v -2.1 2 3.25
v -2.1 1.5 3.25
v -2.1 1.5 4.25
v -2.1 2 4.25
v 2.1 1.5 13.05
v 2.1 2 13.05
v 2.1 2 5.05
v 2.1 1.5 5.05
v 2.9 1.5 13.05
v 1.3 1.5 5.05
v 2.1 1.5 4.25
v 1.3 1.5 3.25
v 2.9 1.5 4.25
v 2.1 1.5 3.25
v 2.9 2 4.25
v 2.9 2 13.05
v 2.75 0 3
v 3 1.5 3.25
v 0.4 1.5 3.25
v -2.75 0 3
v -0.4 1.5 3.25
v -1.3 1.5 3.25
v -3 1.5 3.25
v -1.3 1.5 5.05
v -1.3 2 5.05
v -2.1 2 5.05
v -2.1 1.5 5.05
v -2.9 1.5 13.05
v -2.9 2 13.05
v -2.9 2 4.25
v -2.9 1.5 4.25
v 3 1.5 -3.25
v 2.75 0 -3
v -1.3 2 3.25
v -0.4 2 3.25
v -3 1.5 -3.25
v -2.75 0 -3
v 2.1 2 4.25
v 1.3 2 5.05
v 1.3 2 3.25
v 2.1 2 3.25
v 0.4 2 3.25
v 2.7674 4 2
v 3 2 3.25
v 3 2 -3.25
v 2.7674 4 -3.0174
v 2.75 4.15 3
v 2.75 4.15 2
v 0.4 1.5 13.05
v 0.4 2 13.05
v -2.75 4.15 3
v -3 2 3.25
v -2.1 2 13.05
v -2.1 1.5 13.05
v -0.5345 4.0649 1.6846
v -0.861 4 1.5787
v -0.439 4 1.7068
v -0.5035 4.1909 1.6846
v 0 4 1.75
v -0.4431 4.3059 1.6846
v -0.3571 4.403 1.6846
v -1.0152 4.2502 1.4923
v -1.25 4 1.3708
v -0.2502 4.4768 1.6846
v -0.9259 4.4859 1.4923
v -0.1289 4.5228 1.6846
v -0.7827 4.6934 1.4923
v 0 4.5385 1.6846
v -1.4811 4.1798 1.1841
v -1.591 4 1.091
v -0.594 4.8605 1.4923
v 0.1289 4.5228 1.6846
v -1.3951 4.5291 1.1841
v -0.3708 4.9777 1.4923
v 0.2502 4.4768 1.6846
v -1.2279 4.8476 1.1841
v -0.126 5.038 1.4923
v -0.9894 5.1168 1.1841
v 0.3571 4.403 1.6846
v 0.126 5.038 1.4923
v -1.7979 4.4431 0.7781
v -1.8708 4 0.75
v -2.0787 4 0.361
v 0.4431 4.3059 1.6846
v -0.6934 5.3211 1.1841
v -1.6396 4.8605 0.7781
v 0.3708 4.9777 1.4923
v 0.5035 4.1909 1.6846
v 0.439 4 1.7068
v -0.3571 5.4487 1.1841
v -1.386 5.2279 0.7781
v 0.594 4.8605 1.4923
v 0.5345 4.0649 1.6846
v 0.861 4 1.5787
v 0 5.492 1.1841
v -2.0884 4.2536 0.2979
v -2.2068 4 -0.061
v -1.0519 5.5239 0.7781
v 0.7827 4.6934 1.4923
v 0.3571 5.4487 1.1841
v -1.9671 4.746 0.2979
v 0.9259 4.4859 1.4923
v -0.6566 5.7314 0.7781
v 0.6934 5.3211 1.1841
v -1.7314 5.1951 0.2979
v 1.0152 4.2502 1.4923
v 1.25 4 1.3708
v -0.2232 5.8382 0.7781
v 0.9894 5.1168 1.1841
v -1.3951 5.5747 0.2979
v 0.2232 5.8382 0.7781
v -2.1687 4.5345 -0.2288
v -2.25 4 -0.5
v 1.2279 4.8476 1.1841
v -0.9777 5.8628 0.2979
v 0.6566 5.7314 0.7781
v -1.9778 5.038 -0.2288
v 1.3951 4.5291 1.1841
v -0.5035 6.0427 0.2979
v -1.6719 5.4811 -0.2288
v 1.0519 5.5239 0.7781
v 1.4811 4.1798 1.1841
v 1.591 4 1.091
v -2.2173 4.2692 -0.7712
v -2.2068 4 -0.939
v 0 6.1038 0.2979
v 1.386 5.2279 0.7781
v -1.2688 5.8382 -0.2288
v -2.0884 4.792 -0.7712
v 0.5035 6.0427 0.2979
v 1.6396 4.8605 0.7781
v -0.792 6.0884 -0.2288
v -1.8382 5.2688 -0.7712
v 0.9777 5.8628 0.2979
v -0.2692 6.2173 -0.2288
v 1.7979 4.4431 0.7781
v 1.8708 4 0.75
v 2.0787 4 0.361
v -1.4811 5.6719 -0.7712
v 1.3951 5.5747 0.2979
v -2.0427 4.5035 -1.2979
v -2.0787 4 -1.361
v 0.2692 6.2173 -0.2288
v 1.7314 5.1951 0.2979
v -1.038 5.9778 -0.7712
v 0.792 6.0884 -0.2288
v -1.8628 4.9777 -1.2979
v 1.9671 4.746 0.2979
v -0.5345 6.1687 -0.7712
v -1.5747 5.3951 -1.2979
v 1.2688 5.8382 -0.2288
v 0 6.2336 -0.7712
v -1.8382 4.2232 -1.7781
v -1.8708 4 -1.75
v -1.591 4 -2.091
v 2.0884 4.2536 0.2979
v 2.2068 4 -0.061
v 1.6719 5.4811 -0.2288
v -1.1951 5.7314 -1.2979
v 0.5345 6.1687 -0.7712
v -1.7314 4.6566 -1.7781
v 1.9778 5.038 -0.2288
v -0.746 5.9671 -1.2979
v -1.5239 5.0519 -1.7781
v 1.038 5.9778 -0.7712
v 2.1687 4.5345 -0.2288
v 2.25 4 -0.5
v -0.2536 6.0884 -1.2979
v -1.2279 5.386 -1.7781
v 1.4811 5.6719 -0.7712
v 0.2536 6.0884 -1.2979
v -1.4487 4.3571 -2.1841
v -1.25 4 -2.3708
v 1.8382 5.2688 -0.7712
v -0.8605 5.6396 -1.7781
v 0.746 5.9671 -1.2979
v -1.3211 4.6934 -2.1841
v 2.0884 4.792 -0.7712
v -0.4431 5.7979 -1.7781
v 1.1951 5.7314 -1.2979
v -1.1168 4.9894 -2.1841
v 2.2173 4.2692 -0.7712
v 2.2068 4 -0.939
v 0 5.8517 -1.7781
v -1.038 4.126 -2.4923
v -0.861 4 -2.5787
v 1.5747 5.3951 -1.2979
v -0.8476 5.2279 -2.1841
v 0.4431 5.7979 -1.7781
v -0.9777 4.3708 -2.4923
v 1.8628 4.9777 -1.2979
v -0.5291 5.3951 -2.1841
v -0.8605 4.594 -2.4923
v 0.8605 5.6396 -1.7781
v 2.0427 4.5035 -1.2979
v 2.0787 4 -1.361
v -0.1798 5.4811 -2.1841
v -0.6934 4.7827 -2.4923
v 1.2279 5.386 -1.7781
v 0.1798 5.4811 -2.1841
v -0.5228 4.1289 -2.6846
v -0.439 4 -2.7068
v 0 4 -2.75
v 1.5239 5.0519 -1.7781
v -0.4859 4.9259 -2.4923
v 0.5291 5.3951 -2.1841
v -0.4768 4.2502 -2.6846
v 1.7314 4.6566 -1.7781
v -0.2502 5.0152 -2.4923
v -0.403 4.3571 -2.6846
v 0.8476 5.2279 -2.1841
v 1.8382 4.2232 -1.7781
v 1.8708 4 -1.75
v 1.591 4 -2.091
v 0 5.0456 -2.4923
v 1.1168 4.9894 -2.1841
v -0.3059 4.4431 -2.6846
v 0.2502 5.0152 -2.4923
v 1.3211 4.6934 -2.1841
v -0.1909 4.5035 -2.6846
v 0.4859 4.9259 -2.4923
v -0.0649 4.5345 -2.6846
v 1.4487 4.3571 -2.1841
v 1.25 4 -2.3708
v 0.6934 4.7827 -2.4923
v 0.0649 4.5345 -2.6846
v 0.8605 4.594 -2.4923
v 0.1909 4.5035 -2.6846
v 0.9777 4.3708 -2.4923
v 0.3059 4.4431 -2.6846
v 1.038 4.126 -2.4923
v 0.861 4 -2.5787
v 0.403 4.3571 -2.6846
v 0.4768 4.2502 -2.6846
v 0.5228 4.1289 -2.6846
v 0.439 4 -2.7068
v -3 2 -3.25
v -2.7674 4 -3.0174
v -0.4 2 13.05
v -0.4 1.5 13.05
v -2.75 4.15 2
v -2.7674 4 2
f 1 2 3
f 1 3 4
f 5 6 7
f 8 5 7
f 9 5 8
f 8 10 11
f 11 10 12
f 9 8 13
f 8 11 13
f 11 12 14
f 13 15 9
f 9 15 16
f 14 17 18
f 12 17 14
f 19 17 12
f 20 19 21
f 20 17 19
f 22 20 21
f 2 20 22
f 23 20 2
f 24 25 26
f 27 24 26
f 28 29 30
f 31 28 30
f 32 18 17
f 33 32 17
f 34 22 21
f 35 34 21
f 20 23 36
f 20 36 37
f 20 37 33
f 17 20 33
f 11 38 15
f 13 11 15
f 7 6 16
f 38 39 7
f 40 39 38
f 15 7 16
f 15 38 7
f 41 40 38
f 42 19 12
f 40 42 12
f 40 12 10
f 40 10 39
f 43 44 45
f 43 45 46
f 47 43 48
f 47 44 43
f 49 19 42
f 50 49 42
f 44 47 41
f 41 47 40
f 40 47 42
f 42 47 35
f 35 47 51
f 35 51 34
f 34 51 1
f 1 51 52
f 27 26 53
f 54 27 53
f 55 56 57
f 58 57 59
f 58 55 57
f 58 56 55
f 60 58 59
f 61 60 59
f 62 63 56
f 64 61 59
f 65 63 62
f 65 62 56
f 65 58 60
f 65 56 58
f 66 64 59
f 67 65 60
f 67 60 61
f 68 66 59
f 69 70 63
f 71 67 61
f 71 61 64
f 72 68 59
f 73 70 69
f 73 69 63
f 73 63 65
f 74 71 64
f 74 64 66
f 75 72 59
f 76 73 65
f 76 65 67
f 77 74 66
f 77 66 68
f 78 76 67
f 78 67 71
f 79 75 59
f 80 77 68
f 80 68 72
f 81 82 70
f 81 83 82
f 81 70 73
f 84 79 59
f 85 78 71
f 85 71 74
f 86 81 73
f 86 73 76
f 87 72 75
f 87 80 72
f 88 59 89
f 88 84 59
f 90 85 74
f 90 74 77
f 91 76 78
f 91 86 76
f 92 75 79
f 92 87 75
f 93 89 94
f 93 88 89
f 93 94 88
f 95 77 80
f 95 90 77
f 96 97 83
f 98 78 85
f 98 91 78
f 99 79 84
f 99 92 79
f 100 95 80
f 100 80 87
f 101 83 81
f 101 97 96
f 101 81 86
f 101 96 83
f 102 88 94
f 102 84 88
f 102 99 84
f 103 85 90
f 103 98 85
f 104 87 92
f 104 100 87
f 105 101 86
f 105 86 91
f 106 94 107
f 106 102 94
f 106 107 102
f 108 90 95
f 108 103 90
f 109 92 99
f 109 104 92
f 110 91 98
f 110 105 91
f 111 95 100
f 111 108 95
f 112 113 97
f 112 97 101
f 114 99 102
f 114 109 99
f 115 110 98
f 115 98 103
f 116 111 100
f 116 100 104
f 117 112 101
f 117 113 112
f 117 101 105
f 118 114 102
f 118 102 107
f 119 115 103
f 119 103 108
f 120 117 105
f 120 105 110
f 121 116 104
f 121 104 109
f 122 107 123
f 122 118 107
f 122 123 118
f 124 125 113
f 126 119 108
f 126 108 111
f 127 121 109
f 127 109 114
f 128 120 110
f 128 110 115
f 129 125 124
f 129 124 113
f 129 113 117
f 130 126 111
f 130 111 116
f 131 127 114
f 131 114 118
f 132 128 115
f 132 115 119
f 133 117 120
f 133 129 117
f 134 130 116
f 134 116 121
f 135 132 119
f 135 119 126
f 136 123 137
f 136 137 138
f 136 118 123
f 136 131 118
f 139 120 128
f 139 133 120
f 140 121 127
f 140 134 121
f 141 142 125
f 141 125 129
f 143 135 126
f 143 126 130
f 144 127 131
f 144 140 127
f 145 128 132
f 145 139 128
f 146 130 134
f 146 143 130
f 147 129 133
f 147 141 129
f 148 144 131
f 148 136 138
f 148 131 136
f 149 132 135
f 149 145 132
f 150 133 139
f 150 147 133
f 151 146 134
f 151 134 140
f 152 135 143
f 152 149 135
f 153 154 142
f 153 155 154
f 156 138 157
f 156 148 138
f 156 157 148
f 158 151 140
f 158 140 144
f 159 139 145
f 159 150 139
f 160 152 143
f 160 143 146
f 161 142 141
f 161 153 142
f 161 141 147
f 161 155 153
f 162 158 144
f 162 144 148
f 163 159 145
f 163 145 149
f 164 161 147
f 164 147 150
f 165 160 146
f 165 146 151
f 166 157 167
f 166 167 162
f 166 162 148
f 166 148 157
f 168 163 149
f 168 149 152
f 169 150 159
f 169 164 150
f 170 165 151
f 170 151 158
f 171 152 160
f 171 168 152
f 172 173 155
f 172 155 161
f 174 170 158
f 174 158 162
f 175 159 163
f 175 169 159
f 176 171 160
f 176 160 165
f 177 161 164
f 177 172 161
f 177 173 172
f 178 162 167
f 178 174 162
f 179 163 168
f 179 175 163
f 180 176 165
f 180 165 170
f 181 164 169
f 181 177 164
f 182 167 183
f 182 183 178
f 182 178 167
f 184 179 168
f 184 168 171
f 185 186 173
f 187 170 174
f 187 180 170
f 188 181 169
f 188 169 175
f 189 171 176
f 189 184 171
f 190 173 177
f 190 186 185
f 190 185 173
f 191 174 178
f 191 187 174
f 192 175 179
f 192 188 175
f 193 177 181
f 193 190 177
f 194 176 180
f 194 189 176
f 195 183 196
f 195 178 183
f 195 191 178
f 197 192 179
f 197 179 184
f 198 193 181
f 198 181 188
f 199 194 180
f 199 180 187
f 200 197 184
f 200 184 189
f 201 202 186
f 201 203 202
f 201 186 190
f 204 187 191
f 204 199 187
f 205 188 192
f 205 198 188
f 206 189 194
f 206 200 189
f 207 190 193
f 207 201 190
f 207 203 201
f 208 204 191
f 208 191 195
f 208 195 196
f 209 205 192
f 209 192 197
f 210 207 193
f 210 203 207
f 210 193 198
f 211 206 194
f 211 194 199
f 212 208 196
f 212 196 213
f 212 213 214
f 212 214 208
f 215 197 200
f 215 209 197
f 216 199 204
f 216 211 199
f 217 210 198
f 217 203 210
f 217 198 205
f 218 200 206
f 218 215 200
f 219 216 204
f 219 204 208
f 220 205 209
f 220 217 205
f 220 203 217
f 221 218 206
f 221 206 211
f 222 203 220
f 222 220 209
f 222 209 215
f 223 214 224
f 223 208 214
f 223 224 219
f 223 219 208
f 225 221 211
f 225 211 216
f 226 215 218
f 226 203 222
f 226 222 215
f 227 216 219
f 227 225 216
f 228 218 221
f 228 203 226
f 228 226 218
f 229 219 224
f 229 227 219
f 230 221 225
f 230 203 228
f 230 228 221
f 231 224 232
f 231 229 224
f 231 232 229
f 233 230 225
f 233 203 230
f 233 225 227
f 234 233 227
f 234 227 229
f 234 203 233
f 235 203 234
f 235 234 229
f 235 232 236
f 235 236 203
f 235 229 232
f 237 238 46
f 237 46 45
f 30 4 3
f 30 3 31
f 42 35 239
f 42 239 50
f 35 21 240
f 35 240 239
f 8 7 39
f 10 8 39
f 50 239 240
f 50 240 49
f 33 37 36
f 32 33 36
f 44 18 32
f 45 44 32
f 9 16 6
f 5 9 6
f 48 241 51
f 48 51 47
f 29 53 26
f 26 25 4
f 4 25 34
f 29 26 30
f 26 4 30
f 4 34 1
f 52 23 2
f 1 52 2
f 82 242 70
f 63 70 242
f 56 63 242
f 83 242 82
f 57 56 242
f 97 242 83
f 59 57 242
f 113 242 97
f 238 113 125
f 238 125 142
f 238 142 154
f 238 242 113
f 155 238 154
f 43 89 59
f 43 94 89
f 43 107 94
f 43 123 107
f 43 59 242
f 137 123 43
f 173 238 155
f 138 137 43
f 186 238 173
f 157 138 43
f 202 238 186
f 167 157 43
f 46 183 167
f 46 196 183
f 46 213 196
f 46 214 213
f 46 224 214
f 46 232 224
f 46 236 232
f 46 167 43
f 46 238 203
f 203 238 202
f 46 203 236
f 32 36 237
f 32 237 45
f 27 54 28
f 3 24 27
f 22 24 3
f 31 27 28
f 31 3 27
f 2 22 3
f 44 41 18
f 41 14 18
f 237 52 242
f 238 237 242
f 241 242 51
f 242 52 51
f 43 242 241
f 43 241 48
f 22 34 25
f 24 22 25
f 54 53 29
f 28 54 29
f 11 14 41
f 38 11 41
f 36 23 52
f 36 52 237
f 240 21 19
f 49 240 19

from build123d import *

# Parameters (mm, degrees)
SKETCH1_W           = 6
SKETCH1_H           = 6.5
BOSS_EXTRUDE1_DEPTH = 4
SKETCH2_W           = 0.8
SKETCH2_H           = 0.5
BOSS_EXTRUDE2_DEPTH = 1
SKETCH3_W           = 0.8
SKETCH3_H           = 8.8
BOSS_EXTRUDE3_DEPTH = 0.5
REVOLVE1_ANGLE      = 180
SKETCH5_W           = 6
SKETCH5_H           = 1.25
BOSS_EXTRUDE4_DEPTH = 0.15
CUT_EXTRUDE1_DEPTH  = 13.004270074
CUT_EXTRUDE2_DEPTH  = 16.664131


with BuildPart() as part:
    # Sketch1 → Boss-Extrude1 (new body)
    with BuildSketch(Plane(origin=(0, 0, 0), x_dir=(1, 0, 0), z_dir=(0, 1, 0))):
        Rectangle(SKETCH1_W, SKETCH1_H)
    extrude(amount=BOSS_EXTRUDE1_DEPTH)

    # Sketch2 → Boss-Extrude2 (add)
    with BuildSketch(Plane.XY.offset(3.25)):
        with Locations((-1.7, 1.75)):
            Rectangle(SKETCH2_W, SKETCH2_H)
        with Locations((0, 1.75)):
            Rectangle(SKETCH2_W, SKETCH2_H)
        with Locations((1.7, 1.75)):
            Rectangle(SKETCH2_W, SKETCH2_H)
    extrude(amount=BOSS_EXTRUDE2_DEPTH)

    # Sketch3 → Boss-Extrude3 (add)
    with BuildSketch(Plane(origin=(0, 2, 0), x_dir=(1, 0, 0), z_dir=(0, 1, 0))):
        Polygon((-1.3, -4.25), (-1.3, -5.05), (-2.1, -5.05), (-2.1, -13.05), (-2.9, -13.05), (-2.9, -4.25), (-2.1, -4.25), align=None)
        with Locations((0, -8.65)):
            Rectangle(SKETCH3_W, SKETCH3_H)
        Polygon((1.3, -4.25), (2.9, -4.25), (2.9, -13.05), (2.1, -13.05), (2.1, -5.05), (1.3, -5.05), align=None)
    extrude(amount=-BOSS_EXTRUDE3_DEPTH)

    # Sketch4 → Revolve1 (revolve)
    with BuildSketch(Plane(origin=(0, 4, 0), x_dir=(1, 0, 0), z_dir=(0, 1, 0))):
        with BuildLine():
            Line((0, 2.75), (0, -1.75))
            ThreePointArc((0, -1.75), (-2.25, 0.5), (0, 2.75))
        make_face()
    revolve(axis=Axis((0, 4, -2.75), (0, 0, -1)), revolution_arc=REVOLVE1_ANGLE)

    # Sketch5 → Boss-Extrude4 (add)
    with BuildSketch(Plane(origin=(0, 4, 0), x_dir=(1, 0, 0), z_dir=(0, 1, 0))):
        with Locations((0, -2.625)):
            Rectangle(SKETCH5_W, SKETCH5_H)
    extrude(amount=BOSS_EXTRUDE4_DEPTH)

    # Sketch6 → Cut-Extrude1 (cut, through all)
    with BuildSketch(Plane.XY.offset(3.25)):
        Polygon((-3, 2), (-2.75, 4.15), (-3, 4.15), align=None)
        Polygon((-3, 1.5), (-2.75, 0), (-3, 0), align=None)
        Polygon((3, 0), (3, 1.5), (2.75, 0), align=None)
        Polygon((3, 4.15), (3, 2), (2.75, 4.15), align=None)
    extrude(amount=-CUT_EXTRUDE1_DEPTH, mode=Mode.SUBTRACT)

    # Sketch7 → Cut-Extrude2 (cut, through all)
    with BuildSketch(Plane.ZY.offset(3)):
        Polygon((3.25, 2), (3.25, 4.15), (3, 4.15), align=None)
        Polygon((3.25, 1.5), (3.25, 0), (3, 0), align=None)
        Polygon((-3, 0), (-3.25, 1.5), (-3.25, 0), align=None)
        Polygon((-3, 4.15), (-3.25, 2), (-3.25, 4.15), align=None)
    extrude(amount=-CUT_EXTRUDE2_DEPTH, mode=Mode.SUBTRACT)


solid = part.part
